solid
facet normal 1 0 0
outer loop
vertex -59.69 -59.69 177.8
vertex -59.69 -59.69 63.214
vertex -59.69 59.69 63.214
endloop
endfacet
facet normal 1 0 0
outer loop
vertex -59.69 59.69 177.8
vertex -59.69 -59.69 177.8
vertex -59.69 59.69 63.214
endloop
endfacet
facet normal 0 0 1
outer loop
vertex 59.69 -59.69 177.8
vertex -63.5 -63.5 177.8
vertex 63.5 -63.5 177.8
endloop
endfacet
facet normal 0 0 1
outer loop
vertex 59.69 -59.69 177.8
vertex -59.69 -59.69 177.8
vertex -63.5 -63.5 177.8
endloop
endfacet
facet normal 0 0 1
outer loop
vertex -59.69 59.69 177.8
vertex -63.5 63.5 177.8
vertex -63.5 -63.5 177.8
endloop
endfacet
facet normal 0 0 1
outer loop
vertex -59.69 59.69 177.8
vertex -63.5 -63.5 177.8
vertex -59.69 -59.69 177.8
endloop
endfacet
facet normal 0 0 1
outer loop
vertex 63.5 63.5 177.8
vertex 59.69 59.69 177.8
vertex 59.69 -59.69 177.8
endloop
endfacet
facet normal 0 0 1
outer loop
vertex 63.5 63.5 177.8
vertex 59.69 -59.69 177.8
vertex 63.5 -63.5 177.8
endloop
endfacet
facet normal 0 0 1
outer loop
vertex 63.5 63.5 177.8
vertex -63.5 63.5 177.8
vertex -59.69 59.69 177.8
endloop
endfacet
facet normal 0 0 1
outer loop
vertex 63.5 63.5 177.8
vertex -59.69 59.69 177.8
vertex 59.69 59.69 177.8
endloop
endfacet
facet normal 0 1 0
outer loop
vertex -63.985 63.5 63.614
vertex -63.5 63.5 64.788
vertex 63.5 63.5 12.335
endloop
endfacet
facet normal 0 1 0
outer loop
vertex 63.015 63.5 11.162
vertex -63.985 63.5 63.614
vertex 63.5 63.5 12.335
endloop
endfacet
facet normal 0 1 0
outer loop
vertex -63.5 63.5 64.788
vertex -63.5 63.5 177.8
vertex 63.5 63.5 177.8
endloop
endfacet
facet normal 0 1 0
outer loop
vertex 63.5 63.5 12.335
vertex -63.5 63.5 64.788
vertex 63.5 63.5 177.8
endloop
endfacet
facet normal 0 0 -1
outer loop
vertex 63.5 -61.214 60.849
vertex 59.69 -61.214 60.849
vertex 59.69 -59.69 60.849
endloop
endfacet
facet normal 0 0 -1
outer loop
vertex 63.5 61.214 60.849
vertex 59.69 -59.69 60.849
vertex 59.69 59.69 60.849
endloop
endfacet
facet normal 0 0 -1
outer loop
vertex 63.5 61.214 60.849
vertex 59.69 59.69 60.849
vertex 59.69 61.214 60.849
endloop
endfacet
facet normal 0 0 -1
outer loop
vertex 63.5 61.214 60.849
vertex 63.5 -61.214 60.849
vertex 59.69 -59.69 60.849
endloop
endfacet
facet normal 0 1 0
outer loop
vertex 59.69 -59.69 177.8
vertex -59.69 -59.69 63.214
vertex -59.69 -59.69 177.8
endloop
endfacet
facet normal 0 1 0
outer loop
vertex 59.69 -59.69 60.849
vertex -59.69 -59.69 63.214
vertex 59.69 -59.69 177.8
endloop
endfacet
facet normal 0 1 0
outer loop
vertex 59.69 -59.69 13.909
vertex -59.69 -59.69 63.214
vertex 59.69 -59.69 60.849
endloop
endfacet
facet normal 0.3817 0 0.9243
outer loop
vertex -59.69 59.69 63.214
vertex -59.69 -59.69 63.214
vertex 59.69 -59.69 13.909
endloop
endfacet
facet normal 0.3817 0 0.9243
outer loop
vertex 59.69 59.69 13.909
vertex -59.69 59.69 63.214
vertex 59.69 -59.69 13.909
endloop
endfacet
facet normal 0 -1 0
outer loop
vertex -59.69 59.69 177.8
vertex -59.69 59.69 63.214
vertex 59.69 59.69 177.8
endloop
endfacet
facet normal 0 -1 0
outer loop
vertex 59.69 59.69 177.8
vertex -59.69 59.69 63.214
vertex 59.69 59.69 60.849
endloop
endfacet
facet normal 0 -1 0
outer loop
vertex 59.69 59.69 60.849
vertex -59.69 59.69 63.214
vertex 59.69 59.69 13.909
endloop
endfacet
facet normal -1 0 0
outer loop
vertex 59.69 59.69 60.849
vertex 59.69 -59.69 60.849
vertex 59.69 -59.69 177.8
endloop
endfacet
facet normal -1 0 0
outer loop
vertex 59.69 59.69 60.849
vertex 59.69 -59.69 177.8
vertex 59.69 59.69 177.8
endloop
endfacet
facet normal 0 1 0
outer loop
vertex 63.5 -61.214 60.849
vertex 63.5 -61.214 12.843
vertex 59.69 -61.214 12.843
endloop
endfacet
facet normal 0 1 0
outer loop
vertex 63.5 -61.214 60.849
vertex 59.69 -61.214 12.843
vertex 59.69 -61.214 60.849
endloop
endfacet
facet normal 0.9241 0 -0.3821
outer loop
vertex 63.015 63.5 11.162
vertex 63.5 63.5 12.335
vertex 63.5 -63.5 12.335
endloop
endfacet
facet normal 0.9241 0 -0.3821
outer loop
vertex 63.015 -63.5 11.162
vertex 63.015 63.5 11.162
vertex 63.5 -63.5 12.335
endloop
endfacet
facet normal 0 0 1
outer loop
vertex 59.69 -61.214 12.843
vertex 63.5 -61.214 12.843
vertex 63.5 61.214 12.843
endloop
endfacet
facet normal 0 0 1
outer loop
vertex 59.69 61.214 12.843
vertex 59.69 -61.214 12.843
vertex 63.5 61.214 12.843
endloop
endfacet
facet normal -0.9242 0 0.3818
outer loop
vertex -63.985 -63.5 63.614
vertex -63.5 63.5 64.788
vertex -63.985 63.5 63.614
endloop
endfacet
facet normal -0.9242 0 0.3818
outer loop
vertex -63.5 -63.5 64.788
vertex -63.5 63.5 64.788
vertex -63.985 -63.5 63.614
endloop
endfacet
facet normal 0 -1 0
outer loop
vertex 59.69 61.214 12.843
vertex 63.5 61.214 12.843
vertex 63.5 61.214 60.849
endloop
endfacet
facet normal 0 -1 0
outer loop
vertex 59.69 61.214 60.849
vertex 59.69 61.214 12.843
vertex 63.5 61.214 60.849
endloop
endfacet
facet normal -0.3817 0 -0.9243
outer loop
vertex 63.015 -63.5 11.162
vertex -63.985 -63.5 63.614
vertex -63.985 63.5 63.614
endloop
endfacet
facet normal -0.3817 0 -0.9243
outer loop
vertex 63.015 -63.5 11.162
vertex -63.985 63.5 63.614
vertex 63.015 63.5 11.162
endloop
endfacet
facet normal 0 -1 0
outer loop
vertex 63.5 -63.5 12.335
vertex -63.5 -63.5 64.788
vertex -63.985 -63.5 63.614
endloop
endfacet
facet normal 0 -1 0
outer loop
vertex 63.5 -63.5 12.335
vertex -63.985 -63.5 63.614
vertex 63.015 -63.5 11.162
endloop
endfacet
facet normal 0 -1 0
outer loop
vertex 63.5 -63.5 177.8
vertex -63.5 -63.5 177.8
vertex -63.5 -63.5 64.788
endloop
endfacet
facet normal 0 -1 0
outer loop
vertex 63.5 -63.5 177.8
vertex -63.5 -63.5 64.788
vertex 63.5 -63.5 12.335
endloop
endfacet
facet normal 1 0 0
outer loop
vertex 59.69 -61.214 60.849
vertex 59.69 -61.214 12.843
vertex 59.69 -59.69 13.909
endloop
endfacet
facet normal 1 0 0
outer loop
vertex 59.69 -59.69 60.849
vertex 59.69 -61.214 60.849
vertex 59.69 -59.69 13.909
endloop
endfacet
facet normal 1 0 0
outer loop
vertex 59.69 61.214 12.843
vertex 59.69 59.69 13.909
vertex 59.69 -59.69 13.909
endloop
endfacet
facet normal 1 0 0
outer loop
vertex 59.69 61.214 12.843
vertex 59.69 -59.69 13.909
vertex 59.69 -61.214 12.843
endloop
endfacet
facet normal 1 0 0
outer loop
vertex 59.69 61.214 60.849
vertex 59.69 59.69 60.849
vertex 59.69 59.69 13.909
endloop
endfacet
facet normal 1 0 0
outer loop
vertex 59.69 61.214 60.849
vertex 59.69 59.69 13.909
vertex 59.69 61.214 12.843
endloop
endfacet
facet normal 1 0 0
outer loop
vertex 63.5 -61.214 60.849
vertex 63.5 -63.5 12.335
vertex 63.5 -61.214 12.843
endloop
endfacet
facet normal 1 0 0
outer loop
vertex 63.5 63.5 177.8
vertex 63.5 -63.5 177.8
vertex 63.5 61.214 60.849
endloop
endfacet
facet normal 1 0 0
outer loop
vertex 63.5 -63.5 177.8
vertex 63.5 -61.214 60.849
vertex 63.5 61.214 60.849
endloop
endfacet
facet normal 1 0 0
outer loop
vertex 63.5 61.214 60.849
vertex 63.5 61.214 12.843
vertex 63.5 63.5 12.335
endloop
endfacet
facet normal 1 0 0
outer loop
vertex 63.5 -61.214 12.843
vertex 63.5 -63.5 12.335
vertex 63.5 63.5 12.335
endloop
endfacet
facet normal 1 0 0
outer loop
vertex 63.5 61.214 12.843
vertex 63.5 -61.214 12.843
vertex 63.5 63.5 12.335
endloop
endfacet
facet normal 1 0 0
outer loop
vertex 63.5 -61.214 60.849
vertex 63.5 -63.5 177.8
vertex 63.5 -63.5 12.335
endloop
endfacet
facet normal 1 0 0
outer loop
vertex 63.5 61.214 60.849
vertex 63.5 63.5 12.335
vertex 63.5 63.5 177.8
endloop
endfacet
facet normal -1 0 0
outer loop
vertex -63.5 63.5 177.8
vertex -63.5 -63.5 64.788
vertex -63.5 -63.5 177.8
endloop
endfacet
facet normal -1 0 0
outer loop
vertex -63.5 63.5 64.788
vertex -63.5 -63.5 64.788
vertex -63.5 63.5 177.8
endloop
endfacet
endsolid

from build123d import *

# Parameters (mm, degrees)
F0_W      = 127
F0_H      = 127
F0_W_2    = 119.38
F0_H_2    = 119.38
F1_DEPTH  = 177.8
F10_DEPTH = 127.001
F11_W     = 137.4053613401
F11_H     = 127
F12_DEPTH = 1.27
F13_W     = 122.4279999733
F13_H     = 48.0059999866
F14_DEPTH = 3.81


# Not quite as in the source:
# - a feature of the source that left no trace in its solid (it failed there, or was rolled back) is left out
# - a feature names something its author has since deleted; it is built from what else it names


with BuildPart() as f1:
    # F0 (on Top) → F1 (new body)
    with BuildSketch(Plane.XY):
        Rectangle(F0_W, F0_H)
        Rectangle(F0_W_2, F0_H_2, mode=Mode.SUBTRACT)
    extrude(amount=F1_DEPTH)

    # F8: union 

    # F9 (on face) → F10 (cut, through all)
    with BuildSketch(Plane.XZ.offset(63.5)):
        Polygon((75.6702050567, -13.2453246042), (93.3672711253, 0), (-89.8822396994, 75.6837800145), (-89.8822396994, -21.479823067), align=None)
    extrude(amount=-F10_DEPTH, mode=Mode.SUBTRACT)

    # F11 (on face) → F12 (join)
    with BuildSketch(Plane(origin=(13.6055070593, 0, 32.9423624542), x_dir=(0.924272523, 0, -0.3817332881), z_dir=(-0.3817332881, 0, -0.924272523))):
        with Locations((-14.7202331787, 0)):
            Rectangle(F11_W, F11_H)
    extrude(amount=F12_DEPTH)

    # F13 (on face) → F14 (cut)
    with BuildSketch(Plane.YZ.offset(63.5)):
        with Locations((0, 36.8464652686)):
            Rectangle(F13_W, F13_H)
    extrude(amount=-F14_DEPTH, mode=Mode.SUBTRACT)


solid = f1.part
